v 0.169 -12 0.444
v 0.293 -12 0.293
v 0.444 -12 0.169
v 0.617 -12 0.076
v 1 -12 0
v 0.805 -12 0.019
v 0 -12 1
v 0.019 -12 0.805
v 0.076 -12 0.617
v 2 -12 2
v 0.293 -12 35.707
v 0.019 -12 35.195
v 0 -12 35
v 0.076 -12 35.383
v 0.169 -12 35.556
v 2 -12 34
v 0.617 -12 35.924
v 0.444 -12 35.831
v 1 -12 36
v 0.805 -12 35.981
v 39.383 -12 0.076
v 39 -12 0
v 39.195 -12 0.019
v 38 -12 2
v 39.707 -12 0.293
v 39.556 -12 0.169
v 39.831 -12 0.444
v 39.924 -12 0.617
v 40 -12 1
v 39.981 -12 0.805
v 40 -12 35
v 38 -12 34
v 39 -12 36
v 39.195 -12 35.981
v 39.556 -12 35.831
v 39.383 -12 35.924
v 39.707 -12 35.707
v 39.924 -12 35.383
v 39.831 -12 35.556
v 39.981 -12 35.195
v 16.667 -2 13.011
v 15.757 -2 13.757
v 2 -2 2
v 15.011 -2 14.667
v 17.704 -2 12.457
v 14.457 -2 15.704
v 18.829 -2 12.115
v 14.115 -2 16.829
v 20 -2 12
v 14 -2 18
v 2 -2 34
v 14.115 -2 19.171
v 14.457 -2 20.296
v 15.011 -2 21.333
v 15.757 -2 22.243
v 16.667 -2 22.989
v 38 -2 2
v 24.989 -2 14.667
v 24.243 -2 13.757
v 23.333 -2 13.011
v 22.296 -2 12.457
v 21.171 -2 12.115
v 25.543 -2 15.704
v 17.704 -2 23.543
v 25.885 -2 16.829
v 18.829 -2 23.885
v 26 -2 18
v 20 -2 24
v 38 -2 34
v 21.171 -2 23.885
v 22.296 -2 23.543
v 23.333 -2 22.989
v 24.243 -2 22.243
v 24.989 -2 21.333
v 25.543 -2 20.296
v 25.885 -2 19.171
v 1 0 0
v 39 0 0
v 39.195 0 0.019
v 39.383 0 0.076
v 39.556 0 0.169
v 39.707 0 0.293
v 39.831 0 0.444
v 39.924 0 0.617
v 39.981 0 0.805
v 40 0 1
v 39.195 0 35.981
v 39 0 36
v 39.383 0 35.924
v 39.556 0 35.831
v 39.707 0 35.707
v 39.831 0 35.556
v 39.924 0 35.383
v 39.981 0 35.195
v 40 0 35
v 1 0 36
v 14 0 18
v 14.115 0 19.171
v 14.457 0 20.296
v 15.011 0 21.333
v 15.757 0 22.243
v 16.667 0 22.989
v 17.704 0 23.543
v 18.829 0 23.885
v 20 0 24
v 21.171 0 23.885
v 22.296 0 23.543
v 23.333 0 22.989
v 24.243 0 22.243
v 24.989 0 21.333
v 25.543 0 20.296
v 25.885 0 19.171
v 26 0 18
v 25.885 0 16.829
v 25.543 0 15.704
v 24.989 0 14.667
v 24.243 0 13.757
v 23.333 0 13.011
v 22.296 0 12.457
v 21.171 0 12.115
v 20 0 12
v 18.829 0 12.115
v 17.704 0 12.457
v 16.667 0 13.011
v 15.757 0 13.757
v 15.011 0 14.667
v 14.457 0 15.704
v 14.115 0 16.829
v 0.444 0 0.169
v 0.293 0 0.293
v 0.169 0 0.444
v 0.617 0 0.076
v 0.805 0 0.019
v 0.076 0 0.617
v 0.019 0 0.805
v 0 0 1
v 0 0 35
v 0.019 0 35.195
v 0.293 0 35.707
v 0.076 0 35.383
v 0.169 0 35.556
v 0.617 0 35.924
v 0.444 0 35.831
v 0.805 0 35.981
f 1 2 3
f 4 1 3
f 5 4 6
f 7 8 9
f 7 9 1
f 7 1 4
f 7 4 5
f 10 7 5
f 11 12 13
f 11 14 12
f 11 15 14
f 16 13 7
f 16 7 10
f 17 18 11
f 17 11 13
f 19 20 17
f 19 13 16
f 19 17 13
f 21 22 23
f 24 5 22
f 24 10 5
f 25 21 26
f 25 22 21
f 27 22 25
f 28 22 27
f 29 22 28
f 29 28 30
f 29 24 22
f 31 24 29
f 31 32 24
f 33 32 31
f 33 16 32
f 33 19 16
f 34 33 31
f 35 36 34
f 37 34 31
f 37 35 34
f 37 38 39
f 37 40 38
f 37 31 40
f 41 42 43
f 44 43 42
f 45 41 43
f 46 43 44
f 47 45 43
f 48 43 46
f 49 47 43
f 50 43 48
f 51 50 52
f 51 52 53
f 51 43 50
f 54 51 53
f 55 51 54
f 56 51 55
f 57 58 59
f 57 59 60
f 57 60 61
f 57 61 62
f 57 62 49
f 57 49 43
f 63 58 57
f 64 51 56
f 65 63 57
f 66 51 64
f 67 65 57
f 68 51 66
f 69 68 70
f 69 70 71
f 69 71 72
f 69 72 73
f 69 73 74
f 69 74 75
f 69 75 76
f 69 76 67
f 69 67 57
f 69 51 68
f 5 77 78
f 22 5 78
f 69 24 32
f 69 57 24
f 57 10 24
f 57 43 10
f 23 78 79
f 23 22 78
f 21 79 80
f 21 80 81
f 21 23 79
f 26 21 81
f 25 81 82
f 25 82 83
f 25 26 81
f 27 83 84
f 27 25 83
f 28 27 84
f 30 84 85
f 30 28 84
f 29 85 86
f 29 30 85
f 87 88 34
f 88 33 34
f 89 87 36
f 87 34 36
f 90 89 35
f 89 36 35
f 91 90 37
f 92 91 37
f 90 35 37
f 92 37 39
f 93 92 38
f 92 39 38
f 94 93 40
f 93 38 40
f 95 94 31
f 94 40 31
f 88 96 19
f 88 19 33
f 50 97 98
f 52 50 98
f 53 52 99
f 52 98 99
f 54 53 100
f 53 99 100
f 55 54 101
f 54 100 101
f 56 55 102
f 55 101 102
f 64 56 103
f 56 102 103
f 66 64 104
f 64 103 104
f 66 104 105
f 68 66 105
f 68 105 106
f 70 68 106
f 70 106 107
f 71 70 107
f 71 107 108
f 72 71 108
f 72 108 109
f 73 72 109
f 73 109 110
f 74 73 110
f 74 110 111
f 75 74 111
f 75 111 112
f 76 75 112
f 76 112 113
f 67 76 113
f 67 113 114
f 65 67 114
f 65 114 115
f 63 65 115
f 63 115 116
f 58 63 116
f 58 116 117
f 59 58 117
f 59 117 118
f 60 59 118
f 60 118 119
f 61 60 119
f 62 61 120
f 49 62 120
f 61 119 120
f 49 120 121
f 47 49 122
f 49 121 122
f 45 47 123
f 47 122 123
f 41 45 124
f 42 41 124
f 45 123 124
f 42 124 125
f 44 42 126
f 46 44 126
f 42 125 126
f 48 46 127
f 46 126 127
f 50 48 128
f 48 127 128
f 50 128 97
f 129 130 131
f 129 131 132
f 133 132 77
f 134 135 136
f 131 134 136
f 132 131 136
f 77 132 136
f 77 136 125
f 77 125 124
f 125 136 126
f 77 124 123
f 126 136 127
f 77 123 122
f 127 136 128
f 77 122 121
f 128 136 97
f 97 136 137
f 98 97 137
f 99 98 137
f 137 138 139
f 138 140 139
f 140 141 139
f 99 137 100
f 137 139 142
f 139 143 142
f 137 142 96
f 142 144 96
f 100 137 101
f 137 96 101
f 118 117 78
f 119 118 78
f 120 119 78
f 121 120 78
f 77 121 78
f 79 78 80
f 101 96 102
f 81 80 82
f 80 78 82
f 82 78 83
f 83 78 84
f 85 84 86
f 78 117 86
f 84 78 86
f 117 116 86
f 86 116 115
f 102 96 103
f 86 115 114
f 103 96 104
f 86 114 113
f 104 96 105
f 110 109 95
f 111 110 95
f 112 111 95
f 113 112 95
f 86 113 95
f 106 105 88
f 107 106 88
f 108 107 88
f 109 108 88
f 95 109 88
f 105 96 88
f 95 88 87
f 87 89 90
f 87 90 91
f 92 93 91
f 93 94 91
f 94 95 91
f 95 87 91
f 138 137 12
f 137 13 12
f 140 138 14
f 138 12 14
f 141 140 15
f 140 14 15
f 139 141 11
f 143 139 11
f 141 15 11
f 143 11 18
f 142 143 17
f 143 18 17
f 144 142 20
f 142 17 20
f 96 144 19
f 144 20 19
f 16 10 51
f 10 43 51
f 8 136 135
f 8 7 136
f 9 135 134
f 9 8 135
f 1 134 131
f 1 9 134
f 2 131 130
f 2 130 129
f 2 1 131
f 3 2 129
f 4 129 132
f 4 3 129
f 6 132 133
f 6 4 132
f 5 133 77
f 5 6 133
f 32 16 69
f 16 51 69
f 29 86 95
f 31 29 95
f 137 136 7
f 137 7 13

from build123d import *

# Parameters (mm, degrees)
F0_W     = 40
F0_H     = 36
F1_DEPTH = 12
F2_T     = -2
F3_R     = 6
F4_DEPTH = 25
F5_R     = 1


with BuildPart() as f1:
    # F0 (on Front) → F1 (new body)
    with BuildSketch(Plane.XZ):
        with Locations((20, 18)):
            Rectangle(F0_W, F0_H)
    extrude(amount=F1_DEPTH)

    # F2
    f2_openings = [f1.faces().sort_by_distance(p)[0] for p in [
        (20, -12, 18),
    ]]
    offset(amount=F2_T, openings=f2_openings)

    # F3 (on face) → F4 (cut)
    with BuildSketch(Plane(origin=(0, 0, 0), x_dir=(-1, 0, 0), z_dir=(0, 1, 0))):
        with Locations((-20, 18)):
            Circle(F3_R)
    extrude(amount=-F4_DEPTH, mode=Mode.SUBTRACT)

    # F5
    f5_edges = [f1.edges().sort_by_distance(p)[0] for p in [
        (40, -6, 0),
        (40, -6, 36),
        (0, -6, 0),
        (0, -6, 36),
    ]]
    fillet(f5_edges, radius=F5_R)


solid = f1.part
